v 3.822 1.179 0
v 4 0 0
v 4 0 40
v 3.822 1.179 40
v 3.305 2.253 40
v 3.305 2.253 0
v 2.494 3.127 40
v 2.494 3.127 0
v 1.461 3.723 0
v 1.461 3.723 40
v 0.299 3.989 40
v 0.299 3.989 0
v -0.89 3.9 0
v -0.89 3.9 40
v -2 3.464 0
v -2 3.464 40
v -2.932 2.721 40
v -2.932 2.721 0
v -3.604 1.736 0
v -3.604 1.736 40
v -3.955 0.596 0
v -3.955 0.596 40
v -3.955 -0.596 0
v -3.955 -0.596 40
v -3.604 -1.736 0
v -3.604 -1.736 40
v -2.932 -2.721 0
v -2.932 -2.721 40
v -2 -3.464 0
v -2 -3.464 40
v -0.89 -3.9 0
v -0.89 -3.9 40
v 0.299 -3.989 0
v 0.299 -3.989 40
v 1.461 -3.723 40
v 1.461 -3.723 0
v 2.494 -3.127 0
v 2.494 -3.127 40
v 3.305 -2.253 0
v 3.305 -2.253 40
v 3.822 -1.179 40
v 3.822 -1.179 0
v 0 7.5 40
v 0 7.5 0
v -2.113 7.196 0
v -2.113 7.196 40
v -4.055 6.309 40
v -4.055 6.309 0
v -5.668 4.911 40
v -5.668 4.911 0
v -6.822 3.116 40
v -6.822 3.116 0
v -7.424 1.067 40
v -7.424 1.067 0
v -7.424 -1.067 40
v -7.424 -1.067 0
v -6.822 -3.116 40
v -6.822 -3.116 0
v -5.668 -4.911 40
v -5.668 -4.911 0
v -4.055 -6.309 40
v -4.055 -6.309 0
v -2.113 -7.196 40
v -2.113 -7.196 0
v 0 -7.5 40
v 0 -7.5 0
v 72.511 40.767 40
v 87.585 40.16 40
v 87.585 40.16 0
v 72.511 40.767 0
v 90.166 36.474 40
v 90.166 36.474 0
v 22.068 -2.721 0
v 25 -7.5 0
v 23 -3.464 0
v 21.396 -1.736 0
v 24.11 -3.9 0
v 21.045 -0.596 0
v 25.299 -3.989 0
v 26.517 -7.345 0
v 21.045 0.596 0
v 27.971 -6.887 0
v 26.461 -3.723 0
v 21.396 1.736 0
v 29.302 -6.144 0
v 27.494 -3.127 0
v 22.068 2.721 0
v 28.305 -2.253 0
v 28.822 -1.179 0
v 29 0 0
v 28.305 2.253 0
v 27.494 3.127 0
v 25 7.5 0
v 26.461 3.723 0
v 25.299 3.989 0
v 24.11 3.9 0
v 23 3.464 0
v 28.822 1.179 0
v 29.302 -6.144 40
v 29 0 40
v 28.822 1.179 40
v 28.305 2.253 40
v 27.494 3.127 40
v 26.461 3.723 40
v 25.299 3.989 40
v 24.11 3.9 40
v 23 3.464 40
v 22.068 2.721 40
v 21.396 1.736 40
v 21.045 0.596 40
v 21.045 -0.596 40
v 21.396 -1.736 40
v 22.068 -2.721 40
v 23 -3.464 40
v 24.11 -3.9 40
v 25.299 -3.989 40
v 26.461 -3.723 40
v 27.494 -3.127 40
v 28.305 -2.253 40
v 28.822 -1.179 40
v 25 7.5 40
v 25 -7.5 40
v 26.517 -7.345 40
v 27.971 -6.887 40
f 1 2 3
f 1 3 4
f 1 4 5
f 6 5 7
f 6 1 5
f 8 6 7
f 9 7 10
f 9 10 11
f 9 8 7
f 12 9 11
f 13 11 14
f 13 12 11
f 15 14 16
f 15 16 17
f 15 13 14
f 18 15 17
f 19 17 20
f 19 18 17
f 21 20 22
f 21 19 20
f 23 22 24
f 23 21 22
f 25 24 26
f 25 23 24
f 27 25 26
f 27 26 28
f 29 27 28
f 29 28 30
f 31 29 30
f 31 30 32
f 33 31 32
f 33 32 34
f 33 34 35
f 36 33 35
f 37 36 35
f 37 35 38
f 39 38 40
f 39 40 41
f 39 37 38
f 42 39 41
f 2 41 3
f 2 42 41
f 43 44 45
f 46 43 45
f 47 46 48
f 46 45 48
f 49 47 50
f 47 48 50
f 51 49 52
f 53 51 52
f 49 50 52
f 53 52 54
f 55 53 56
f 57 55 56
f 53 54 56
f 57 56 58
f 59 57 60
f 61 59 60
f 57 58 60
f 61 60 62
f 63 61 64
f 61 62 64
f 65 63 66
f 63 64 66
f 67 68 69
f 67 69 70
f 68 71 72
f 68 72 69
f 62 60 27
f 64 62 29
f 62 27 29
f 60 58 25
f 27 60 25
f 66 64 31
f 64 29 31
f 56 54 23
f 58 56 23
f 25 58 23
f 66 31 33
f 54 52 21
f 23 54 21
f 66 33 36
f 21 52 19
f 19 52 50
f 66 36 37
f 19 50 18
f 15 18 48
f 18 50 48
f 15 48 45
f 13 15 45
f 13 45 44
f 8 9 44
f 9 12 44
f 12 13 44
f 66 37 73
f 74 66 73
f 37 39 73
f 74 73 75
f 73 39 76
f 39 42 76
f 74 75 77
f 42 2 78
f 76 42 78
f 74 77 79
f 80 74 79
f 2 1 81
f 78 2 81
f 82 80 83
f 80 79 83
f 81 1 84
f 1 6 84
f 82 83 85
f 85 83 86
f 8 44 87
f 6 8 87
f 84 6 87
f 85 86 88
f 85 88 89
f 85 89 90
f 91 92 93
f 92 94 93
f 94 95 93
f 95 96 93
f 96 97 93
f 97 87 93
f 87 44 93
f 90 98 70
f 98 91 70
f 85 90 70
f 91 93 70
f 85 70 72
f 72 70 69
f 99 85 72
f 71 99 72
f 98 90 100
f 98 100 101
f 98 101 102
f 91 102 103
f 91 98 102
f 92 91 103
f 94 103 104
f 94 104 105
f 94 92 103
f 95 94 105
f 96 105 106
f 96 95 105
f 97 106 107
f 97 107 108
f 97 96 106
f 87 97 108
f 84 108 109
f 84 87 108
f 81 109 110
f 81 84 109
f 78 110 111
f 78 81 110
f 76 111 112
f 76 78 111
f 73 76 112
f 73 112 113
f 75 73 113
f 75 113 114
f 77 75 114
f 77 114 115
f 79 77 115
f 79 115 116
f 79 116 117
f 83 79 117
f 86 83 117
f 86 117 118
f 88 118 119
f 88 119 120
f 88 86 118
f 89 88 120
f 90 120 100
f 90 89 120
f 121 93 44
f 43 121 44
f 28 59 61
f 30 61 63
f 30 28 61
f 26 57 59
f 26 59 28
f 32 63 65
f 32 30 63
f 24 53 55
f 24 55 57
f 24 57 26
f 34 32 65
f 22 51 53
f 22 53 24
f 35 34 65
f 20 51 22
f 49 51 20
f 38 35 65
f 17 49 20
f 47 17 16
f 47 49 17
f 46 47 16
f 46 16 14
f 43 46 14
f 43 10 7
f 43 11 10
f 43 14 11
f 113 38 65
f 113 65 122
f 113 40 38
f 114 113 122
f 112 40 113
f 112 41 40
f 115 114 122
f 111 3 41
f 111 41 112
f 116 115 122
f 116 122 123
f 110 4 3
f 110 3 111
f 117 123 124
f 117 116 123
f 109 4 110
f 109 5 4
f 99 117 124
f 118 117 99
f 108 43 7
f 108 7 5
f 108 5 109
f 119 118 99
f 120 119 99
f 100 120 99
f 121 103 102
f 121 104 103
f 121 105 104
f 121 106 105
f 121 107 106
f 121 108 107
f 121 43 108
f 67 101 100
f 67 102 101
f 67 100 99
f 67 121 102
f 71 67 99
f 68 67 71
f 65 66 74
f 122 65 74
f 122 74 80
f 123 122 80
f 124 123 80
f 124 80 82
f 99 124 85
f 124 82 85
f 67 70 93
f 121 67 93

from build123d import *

# Parameters (mm, degrees)
SKETCH2_R           = 4
BOSS_EXTRUDE1_DEPTH = 40


with BuildPart() as part:
    # Sketch2 → Boss-Extrude1 (new body)
    with BuildSketch(Plane.XY):
        with BuildLine():
            Line((25, 7.5), (0, 7.5))
            ThreePointArc((0, 7.5), (-7.5, 0), (0, -7.5))
            Line((0, -7.5), (25, -7.5))
            ThreePointArc((25, -7.5), (27.255293496, -7.152877131), (29.301823273, -6.143640332))
            Line((29.301823273, -6.143640332), (90.166313701, 36.474134675))
            Line((90.166313701, 36.474134675), (87.585219737, 40.160318874))
            Line((87.585219737, 40.160318874), (72.510818569, 40.767433308))
            Line((72.510818569, 40.767433308), (25, 7.5))
        make_face()
        Circle(SKETCH2_R, mode=Mode.SUBTRACT)
        with Locations((25, 0)):
            Circle(SKETCH2_R, mode=Mode.SUBTRACT)
    extrude(amount=BOSS_EXTRUDE1_DEPTH)


solid = part.part
